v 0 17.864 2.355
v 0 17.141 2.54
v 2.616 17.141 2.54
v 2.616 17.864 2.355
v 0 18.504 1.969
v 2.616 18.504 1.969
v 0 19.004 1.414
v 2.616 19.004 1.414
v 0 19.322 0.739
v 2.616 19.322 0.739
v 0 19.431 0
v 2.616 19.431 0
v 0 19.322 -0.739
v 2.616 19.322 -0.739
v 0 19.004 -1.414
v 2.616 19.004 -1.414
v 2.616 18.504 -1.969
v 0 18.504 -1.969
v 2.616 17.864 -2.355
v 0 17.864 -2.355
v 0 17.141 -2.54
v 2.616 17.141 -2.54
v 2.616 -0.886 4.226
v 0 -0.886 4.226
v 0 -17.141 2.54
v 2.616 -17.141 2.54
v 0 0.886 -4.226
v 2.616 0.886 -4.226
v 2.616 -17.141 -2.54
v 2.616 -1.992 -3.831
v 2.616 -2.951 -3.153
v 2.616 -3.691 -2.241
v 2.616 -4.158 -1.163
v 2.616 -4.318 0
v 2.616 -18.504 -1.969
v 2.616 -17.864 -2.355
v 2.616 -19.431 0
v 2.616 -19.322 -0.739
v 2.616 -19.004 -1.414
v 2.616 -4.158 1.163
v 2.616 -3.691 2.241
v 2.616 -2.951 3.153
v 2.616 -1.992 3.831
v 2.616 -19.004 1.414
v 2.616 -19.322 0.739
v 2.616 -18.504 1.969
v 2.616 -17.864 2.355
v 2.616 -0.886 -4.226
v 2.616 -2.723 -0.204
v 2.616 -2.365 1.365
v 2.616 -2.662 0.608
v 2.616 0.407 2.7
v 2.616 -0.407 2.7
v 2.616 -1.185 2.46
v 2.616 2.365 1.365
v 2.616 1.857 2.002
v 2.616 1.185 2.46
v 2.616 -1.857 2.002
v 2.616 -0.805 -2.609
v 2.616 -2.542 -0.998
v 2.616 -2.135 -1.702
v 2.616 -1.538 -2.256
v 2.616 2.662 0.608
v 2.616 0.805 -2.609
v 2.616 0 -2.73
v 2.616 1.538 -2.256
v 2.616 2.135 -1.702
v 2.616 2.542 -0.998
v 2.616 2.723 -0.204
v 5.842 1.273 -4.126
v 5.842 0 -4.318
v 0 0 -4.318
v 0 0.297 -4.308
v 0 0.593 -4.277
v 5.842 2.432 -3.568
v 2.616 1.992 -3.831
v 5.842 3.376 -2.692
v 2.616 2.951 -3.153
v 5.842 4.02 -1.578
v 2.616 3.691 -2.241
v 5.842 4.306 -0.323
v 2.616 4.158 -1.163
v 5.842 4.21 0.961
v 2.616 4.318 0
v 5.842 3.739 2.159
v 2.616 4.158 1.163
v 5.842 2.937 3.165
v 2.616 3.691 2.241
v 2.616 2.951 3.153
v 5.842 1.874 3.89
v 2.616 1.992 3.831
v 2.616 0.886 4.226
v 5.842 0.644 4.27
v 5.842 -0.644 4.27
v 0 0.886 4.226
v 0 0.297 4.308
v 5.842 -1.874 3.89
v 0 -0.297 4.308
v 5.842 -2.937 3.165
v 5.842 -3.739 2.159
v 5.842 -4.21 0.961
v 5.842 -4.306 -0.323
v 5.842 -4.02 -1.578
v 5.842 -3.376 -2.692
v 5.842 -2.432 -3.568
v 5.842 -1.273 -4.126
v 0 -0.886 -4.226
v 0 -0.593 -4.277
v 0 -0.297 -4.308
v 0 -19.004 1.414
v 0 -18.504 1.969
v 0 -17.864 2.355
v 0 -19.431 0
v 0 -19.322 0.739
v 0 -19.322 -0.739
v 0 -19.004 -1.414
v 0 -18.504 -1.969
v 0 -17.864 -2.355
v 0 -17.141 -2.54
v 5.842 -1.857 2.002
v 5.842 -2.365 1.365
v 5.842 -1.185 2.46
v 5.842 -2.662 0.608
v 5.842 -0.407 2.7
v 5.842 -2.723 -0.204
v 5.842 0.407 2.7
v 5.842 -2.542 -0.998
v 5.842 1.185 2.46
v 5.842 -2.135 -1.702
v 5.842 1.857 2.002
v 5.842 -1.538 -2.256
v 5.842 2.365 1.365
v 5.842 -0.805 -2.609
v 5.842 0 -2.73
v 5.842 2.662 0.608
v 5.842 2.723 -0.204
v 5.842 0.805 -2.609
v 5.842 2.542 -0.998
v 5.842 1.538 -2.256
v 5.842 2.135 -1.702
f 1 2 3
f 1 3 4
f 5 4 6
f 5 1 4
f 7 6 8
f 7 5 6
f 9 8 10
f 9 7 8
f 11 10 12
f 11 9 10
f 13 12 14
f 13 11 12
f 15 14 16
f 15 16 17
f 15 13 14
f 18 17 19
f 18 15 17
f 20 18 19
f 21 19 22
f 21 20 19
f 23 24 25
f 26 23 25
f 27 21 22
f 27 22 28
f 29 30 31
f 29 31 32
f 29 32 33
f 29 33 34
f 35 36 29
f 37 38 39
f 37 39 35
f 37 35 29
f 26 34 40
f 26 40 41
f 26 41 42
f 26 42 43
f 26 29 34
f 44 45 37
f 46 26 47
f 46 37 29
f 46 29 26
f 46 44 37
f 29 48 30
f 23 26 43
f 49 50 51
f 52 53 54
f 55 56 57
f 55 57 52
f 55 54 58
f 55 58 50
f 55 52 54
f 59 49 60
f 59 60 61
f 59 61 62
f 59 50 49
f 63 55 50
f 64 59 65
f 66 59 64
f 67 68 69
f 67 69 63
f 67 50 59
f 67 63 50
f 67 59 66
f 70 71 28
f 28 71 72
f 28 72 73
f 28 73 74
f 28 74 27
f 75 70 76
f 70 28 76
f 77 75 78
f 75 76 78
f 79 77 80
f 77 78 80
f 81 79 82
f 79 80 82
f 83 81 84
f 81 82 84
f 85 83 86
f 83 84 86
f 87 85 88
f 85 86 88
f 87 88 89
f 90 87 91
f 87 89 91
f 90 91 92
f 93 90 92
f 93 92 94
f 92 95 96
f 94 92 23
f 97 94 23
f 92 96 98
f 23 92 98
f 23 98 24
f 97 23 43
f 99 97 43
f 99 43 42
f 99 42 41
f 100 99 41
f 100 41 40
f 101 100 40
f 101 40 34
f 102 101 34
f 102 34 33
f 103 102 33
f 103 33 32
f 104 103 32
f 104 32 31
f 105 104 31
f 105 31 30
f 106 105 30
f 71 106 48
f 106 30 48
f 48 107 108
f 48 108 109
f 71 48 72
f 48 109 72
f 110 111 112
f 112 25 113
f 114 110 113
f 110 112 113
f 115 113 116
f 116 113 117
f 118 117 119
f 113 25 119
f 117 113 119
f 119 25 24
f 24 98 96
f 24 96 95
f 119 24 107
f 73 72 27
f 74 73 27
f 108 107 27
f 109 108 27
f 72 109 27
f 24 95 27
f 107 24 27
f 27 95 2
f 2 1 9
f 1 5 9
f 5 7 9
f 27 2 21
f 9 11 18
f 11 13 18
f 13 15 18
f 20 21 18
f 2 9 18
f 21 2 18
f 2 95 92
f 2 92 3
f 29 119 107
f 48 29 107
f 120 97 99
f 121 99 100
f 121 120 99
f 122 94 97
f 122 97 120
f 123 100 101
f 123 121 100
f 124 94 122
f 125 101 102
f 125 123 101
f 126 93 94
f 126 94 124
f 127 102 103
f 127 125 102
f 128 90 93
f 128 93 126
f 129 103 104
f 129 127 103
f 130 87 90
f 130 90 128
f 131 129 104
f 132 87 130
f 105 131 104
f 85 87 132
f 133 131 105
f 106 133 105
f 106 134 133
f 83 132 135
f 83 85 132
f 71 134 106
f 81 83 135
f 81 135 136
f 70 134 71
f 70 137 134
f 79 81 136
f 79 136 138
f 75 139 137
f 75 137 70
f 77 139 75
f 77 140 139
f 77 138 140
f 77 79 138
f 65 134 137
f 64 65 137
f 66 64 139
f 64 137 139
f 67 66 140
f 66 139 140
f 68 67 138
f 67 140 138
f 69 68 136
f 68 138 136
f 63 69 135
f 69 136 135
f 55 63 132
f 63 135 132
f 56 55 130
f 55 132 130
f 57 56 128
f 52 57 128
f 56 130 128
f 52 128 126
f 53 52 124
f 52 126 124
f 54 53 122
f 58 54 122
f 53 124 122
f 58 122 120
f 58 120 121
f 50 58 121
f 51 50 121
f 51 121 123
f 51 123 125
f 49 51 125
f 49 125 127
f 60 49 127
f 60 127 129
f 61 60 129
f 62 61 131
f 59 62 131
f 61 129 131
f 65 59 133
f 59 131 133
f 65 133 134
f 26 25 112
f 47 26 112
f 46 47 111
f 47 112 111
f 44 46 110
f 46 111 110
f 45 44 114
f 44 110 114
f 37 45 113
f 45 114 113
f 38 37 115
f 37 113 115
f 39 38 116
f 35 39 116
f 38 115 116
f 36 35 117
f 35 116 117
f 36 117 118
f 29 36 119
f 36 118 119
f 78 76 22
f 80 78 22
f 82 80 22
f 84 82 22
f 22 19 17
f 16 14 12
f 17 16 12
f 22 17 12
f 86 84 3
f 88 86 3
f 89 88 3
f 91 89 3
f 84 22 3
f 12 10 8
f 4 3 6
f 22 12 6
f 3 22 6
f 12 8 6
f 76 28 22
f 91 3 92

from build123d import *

# Parameters (mm, degrees)
SKETCH1_R           = 4.318
BOSS_EXTRUDE1_DEPTH = 5.842
BOSS_EXTRUDE2_DEPTH = 2.6162
SKETCH3_R           = 2.7305
CUT_EXTRUDE1_DEPTH  = 3.2258


with BuildPart() as part:
    # Sketch1 → Boss-Extrude1 (new body)
    with BuildSketch(Plane(origin=(0, 0, 0), x_dir=(0, 0, -1), z_dir=(1, 0, 0))):
        Circle(SKETCH1_R)
    extrude(amount=BOSS_EXTRUDE1_DEPTH)

    # Sketch2 → Boss-Extrude2 (add)
    with BuildSketch(Plane.ZY):
        with BuildLine():
            Line((-2.54, 17.140843061), (-4.226068598, 0.886266441))
            ThreePointArc((-4.226068598, 0.886266441), (0, 4.318), (4.226068598, 0.886266441))
            Line((4.226068598, 0.886266441), (2.54, 17.140843061))
            ThreePointArc((2.54, 17.140843061), (0, 19.431), (-2.54, 17.140843061))
        make_face()
    boss_extrude2 = extrude(amount=-BOSS_EXTRUDE2_DEPTH)

    # Mirror1: Boss-Extrude2 across plane
    add(boss_extrude2.mirror(Plane.ZX))

    # Sketch3 → Cut-Extrude1 (cut)
    with BuildSketch(Plane(origin=(5.842, 0, 0), x_dir=(0, 0, -1), z_dir=(1, 0, 0))):
        Circle(SKETCH3_R)
    extrude(amount=-CUT_EXTRUDE1_DEPTH, mode=Mode.SUBTRACT)


solid = part.part
